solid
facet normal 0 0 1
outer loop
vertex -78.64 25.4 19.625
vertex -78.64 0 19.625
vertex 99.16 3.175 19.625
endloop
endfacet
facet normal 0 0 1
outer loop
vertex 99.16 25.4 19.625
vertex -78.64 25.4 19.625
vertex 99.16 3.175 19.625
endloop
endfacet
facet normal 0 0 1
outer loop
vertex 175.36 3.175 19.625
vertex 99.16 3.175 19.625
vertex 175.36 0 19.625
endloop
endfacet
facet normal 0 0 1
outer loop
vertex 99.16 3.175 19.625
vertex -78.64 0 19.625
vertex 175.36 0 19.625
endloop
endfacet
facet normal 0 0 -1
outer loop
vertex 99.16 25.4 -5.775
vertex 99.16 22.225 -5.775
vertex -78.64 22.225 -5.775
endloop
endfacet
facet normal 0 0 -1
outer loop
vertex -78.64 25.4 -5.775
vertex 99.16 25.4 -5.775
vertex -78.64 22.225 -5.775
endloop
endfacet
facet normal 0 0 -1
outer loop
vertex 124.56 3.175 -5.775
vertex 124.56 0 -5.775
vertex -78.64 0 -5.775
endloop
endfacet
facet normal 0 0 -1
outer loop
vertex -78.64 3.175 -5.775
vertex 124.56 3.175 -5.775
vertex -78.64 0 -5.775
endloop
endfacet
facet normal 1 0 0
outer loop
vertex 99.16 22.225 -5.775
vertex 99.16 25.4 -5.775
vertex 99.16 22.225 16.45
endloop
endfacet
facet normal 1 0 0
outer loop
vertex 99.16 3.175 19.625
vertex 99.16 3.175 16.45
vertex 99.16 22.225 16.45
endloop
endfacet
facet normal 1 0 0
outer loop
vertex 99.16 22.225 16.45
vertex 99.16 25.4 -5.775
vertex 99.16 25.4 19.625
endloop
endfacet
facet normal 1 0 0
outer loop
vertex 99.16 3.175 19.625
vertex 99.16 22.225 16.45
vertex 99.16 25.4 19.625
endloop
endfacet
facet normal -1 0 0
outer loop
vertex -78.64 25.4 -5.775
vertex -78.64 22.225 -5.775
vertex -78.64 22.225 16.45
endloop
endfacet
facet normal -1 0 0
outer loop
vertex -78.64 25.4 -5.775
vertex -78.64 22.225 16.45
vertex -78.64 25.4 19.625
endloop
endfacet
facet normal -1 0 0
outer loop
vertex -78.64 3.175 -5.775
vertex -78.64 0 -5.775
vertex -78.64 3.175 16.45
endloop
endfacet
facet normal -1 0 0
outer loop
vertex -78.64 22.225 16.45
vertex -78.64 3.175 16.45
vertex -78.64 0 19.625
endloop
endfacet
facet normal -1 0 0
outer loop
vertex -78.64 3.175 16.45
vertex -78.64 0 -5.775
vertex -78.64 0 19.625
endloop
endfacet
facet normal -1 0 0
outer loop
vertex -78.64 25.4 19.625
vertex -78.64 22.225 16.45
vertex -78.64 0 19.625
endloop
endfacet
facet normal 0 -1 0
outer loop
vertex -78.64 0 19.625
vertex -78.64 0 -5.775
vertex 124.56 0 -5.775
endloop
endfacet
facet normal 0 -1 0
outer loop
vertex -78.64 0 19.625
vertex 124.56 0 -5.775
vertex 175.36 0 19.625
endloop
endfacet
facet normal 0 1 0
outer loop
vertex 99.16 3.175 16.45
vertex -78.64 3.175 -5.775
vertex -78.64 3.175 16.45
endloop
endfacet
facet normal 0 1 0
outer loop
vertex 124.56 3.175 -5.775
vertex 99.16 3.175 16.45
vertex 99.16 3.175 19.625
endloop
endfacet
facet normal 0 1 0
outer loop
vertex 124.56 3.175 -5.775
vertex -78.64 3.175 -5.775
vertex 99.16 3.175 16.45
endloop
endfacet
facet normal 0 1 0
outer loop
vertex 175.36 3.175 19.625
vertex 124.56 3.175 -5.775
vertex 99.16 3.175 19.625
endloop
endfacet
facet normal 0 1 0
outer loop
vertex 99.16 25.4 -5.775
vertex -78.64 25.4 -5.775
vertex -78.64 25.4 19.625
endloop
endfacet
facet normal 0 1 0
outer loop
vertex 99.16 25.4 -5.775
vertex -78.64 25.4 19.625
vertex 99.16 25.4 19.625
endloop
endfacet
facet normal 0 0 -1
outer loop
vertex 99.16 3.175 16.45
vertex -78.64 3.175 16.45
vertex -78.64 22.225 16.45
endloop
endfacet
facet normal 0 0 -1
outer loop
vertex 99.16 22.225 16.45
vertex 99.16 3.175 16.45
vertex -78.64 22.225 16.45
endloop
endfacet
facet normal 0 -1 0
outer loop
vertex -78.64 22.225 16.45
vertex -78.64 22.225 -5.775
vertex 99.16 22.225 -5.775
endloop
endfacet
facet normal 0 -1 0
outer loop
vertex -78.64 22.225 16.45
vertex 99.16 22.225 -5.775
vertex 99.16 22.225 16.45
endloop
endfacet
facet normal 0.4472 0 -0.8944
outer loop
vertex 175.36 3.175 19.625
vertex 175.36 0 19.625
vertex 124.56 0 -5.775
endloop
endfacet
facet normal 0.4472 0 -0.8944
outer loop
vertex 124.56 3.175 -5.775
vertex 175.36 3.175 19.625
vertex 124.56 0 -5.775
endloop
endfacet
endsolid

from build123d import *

# Parameters (mm, degrees)
BOSS_EXTRUDE1_DEPTH = 25.4
SKETCH2_W           = 19.05
SKETCH2_H           = 19.05
CUT_EXTRUDE1_DEPTH  = 257.020099216
CUT_EXTRUDE2_DEPTH  = 22.225
SKETCH5_W           = 177.8
SKETCH5_H           = 19.05
CUT_EXTRUDE4_DEPTH  = 22.225


with BuildPart() as part:
    # Sketch1 → Boss-Extrude1 (new body)
    with BuildSketch(Plane(origin=(0, 0, 0), x_dir=(1, 0, 0), z_dir=(0, 1, 0))):
        Polygon((-78.640492639, -19.624759931), (175.359507361, -19.624759931), (124.559507361, 5.775240069), (-78.640492639, 5.775240069), align=None)
    extrude(amount=BOSS_EXTRUDE1_DEPTH)

    # Sketch2 → Cut-Extrude1 (cut, through all)
    with BuildSketch(Plane.ZY.offset(78.640492639)):
        with Locations((6.924759931, 12.7)):
            Rectangle(SKETCH2_W, SKETCH2_H)
    extrude(amount=-CUT_EXTRUDE1_DEPTH, mode=Mode.SUBTRACT)

    # Sketch3 → Cut-Extrude2 (cut)
    with BuildSketch(Plane(origin=(0, 25.4, 0), x_dir=(1, 0, 0), z_dir=(0, 1, 0))):
        Polygon((99.159507361, 5.775240069), (99.159507361, -19.624759931), (175.359507361, -19.624759931), (124.559507361, 5.775240069), align=None)
    extrude(amount=-CUT_EXTRUDE2_DEPTH, mode=Mode.SUBTRACT)

    # Sketch5 → Cut-Extrude4 (cut)
    with BuildSketch(Plane(origin=(0, 0, -5.775240069), x_dir=(-1, 0, 0), z_dir=(0, 0, -1))):
        with Locations((-10.259507361, 12.7)):
            Rectangle(SKETCH5_W, SKETCH5_H)
    extrude(amount=-CUT_EXTRUDE4_DEPTH, mode=Mode.SUBTRACT)


solid = part.part
